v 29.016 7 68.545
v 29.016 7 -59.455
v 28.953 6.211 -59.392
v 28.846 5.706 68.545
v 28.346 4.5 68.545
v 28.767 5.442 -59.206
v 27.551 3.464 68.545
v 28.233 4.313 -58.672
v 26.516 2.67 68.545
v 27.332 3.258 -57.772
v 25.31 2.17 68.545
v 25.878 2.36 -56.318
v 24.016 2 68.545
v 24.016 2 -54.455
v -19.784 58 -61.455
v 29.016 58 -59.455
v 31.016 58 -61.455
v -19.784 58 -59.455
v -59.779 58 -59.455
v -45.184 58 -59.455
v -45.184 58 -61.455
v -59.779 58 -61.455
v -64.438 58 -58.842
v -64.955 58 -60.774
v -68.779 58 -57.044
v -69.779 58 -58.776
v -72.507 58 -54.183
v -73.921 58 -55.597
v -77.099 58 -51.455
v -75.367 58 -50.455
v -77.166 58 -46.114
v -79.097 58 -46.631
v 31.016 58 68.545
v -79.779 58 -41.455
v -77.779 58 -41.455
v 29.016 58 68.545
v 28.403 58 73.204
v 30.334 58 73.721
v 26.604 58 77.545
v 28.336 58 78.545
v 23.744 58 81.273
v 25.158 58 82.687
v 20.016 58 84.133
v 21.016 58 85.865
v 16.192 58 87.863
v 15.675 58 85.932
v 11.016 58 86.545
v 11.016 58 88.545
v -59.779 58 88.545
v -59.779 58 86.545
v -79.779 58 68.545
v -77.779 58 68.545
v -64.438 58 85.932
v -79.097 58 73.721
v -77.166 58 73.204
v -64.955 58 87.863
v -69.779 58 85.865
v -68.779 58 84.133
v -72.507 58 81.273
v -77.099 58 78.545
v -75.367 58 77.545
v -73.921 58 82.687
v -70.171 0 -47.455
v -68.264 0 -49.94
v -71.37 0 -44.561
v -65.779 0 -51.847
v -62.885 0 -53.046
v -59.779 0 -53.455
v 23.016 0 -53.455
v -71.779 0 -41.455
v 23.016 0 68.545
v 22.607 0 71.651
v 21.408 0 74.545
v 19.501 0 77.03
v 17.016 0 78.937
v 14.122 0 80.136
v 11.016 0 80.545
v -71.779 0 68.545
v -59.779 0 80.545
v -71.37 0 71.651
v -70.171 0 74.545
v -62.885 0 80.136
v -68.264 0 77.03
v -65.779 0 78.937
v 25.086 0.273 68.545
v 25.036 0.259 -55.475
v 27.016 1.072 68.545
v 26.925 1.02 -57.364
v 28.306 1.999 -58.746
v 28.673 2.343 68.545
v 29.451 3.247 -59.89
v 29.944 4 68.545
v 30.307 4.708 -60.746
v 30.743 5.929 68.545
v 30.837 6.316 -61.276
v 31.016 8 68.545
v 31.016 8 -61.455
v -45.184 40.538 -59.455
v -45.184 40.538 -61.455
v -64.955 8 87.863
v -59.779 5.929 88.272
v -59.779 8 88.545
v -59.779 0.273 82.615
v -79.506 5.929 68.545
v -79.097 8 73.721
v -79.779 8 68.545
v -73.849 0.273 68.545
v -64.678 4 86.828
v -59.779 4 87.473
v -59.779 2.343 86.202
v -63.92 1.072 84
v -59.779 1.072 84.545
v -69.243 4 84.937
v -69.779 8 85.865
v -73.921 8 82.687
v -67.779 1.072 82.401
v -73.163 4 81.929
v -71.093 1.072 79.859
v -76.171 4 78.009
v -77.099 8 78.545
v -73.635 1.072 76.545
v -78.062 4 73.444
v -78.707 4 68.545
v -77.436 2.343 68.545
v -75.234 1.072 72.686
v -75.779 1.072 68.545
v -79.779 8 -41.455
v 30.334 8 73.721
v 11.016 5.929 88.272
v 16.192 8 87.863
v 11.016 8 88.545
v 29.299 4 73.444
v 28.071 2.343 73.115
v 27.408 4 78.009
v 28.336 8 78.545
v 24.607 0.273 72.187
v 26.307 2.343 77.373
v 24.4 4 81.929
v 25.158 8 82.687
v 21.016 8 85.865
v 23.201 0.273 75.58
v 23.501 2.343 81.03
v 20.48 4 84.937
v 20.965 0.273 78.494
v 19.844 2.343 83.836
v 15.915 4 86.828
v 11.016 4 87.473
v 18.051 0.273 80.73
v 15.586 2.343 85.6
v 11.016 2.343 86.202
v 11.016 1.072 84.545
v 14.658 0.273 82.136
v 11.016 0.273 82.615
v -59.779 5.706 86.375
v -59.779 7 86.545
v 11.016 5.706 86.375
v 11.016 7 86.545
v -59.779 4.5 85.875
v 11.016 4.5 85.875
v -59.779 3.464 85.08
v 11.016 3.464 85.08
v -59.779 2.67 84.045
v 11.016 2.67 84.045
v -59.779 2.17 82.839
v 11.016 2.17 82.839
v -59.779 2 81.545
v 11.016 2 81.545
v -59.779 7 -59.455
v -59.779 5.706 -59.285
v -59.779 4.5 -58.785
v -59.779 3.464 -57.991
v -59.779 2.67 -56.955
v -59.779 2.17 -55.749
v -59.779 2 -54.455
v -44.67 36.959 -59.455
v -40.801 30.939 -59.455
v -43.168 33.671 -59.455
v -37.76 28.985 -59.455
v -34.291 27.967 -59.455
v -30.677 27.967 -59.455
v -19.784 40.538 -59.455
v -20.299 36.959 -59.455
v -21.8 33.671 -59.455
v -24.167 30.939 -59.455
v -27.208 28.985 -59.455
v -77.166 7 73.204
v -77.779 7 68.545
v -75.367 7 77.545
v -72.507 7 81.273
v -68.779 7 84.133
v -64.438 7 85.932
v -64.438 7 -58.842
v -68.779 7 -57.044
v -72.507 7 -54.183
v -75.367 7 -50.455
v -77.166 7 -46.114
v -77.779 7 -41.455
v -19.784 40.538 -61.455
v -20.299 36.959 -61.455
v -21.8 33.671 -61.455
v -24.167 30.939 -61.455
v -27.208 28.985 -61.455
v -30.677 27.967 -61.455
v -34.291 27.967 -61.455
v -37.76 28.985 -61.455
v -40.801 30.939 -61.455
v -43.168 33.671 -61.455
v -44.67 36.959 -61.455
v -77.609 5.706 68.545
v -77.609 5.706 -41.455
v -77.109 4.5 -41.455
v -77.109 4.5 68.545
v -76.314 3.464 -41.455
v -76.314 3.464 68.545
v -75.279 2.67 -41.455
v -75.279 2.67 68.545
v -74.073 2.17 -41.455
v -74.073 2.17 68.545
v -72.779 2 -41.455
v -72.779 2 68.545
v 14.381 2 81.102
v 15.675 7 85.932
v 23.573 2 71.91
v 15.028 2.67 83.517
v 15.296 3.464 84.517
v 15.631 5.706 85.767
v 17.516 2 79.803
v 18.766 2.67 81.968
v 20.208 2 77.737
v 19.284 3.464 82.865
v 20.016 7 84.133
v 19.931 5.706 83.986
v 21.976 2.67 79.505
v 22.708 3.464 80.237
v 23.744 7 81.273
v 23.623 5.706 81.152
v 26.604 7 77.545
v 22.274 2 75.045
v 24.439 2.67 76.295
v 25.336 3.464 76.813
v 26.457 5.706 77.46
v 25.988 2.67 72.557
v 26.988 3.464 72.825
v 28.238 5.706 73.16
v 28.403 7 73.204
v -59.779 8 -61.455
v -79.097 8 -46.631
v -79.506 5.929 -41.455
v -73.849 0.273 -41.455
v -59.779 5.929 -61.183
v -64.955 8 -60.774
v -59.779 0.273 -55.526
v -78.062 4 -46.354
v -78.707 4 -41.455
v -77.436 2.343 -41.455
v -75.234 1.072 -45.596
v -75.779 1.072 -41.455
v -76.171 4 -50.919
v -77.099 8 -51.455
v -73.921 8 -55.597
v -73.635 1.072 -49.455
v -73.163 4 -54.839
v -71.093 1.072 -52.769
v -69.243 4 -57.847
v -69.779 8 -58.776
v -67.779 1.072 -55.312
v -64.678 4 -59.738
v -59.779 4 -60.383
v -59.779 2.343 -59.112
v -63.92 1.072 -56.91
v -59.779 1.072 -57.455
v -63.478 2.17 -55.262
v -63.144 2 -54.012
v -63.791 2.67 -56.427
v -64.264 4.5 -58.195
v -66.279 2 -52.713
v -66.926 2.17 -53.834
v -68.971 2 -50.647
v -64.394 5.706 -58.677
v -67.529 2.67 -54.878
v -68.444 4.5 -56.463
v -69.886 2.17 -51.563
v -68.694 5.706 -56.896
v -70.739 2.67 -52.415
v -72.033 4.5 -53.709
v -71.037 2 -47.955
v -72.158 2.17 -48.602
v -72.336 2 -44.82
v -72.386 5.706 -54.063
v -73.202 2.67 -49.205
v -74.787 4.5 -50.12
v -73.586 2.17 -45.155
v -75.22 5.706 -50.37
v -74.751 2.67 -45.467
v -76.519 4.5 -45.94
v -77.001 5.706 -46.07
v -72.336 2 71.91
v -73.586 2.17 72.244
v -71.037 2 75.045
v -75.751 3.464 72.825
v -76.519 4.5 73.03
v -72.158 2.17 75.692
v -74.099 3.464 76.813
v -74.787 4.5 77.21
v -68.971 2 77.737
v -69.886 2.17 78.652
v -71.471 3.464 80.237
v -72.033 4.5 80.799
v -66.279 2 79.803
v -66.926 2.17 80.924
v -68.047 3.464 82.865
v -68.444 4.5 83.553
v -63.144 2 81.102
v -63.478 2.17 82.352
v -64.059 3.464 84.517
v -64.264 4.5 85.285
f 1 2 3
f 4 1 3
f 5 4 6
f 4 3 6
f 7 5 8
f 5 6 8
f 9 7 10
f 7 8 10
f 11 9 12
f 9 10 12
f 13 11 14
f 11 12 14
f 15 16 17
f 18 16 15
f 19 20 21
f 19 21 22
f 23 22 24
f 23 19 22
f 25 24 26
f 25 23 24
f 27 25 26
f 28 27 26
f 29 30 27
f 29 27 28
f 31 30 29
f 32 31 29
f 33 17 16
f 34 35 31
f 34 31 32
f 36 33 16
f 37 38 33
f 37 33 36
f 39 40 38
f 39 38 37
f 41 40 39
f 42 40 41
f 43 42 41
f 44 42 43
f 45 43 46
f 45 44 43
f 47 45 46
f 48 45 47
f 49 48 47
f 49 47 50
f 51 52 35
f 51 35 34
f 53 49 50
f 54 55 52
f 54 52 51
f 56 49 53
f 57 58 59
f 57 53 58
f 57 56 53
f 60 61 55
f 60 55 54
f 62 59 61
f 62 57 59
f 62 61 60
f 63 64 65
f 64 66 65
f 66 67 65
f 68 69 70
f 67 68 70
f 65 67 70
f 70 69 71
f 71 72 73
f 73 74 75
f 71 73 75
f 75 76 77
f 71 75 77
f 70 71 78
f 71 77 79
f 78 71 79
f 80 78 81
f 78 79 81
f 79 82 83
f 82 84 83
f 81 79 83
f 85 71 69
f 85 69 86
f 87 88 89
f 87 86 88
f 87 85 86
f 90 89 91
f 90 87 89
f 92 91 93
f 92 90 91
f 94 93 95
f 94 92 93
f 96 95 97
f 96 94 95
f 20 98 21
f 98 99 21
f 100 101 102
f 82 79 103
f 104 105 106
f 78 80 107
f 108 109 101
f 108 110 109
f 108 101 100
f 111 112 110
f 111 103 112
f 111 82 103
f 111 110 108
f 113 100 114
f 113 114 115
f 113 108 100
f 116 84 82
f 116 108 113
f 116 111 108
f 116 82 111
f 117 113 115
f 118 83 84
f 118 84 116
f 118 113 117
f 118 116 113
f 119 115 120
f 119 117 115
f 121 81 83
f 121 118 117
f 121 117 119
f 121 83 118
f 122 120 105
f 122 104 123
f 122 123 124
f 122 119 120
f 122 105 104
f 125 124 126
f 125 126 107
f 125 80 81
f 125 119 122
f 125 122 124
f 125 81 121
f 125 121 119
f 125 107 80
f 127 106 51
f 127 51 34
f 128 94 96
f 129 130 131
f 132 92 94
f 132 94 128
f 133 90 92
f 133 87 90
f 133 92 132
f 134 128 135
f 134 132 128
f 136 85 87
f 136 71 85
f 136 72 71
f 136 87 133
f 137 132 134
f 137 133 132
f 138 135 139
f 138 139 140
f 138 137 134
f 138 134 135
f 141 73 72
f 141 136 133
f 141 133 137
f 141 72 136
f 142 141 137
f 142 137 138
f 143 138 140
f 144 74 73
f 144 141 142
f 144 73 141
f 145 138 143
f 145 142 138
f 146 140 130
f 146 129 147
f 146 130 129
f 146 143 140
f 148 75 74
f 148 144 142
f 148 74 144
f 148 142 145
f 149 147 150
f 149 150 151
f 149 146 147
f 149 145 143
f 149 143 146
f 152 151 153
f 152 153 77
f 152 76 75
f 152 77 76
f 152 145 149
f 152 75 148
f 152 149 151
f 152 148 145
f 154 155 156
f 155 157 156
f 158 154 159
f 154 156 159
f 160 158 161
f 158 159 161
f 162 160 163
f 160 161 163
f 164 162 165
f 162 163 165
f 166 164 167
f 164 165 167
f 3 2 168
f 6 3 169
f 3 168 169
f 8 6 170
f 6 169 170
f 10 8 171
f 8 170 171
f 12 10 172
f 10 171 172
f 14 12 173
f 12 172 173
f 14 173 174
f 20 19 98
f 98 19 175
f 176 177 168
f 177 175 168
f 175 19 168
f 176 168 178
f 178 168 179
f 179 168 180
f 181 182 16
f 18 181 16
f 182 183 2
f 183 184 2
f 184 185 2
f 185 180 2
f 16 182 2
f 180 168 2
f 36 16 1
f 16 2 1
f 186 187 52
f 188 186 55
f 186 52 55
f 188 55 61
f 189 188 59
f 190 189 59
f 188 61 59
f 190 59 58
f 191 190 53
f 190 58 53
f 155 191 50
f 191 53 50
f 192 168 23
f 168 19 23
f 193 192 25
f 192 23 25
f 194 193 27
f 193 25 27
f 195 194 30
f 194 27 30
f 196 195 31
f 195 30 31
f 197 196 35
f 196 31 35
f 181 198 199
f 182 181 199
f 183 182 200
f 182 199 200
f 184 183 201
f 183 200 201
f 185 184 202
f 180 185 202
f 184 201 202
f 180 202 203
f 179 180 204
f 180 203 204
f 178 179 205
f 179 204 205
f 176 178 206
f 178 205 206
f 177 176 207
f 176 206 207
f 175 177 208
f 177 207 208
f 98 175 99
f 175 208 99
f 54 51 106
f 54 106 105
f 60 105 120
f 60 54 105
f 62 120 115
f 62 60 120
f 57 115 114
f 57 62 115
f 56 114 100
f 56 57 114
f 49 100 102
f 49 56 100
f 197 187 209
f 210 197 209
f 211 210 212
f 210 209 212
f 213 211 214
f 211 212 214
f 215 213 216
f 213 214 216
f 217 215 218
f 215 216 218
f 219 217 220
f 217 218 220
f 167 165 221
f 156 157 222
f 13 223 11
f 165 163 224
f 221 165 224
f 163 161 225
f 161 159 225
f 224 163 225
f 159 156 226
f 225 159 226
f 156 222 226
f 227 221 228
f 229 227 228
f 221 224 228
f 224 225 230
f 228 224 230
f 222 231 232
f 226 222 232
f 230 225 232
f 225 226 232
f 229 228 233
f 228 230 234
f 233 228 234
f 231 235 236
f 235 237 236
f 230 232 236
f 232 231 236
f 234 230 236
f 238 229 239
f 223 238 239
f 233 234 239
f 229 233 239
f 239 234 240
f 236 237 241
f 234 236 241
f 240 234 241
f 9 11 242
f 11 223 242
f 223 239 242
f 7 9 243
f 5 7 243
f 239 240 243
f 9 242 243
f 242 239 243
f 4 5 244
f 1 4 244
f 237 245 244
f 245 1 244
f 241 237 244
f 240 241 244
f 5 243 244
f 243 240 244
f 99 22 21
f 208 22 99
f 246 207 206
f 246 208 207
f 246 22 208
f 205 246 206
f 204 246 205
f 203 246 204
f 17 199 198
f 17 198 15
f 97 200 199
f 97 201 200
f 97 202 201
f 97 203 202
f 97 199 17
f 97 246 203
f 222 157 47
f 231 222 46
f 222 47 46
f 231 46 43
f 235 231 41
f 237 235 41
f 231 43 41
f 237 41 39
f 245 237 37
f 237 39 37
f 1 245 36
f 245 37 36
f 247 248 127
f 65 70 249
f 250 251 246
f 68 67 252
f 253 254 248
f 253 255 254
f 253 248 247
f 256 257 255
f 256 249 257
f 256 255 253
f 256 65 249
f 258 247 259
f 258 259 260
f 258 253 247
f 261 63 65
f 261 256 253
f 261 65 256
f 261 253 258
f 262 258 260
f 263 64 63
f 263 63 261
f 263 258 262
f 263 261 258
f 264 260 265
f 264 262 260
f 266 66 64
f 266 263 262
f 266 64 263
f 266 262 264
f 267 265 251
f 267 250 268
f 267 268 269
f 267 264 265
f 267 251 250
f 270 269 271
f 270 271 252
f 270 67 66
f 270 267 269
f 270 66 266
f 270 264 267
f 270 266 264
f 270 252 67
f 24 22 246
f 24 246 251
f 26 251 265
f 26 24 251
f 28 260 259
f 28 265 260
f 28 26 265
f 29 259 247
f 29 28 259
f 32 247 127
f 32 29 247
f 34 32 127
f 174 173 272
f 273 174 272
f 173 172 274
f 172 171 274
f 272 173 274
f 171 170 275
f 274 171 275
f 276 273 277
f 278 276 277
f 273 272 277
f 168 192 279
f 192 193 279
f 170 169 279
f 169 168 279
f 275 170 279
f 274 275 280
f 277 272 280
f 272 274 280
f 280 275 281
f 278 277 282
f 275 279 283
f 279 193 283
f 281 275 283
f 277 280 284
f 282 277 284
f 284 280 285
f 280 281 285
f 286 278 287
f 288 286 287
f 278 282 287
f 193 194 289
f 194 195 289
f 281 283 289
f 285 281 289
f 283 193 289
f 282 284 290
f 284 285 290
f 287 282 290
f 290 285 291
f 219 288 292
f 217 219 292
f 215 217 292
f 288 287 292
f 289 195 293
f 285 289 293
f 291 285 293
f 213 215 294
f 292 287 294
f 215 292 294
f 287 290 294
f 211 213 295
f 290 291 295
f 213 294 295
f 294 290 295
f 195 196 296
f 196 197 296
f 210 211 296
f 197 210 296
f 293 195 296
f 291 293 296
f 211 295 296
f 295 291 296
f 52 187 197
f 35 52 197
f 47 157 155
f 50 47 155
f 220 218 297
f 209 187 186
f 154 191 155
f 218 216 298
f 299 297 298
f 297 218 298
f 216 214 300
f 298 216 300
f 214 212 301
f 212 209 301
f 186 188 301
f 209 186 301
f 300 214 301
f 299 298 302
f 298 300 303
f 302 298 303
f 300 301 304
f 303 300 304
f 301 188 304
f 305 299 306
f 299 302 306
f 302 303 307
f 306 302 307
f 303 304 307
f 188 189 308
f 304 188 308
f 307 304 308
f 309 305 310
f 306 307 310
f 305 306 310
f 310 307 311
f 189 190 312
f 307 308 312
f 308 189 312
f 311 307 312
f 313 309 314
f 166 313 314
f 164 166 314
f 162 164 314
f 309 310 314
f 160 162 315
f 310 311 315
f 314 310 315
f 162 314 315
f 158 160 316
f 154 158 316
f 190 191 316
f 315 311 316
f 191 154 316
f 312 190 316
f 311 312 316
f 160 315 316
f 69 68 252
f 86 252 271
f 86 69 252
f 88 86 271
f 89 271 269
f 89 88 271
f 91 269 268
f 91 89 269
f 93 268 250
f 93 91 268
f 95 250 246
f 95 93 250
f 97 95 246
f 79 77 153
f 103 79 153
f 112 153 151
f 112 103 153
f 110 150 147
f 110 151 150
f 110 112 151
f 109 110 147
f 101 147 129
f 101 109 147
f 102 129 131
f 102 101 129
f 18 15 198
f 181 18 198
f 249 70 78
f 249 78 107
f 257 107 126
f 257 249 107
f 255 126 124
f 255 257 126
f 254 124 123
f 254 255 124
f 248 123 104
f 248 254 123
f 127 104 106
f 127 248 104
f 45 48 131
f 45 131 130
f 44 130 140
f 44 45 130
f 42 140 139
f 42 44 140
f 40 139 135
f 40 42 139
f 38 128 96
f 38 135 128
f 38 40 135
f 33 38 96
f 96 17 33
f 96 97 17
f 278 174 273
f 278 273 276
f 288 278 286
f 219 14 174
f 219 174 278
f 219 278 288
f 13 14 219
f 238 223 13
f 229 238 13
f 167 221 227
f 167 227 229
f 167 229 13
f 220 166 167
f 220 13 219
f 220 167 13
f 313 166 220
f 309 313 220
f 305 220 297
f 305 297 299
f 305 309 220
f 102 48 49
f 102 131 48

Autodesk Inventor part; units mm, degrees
ref_plane "YZ Plane" through (0, 0, 0) normal (1, 0, 0) x (0, 1, 0)
ref_plane "XZ Plane" through (0, 0, 0) normal (0, 1, 0) x (-1, 0, 0)
ref_plane "XY Plane" through (0, 0, 0) normal (0, 0, 1) x (1, 0, 0)
sketch "Sketch1" plane through (0, 0, 0) normal (0, 1, 0) x (-1, 0, 0)
  line L0 (79.7789, 88.5449) -> (79.7789, -61.4551)
  line L1 (79.7789, -61.4551) -> (-31.0159, -61.4551)
  line L2 (-31.0159, -61.4551) -> (-31.0159, 88.5449)
  line L3 (-31.0159, 88.5449) -> (79.7789, 88.5449)
  point P0 (0, 0)
  dimension "d0" = 150
  dimension "d1" = 110.7948
extrude "Body" add sketch "Sketch1" along normal blind 58
fillet "Fillet6" radius 20 1 edges at (-79.7789, 29, -61.4551)
fillet "Fillet4" radius 20 1 edges at (-79.7789, 29, 88.5449)
fillet "Fillet2" radius 20 1 edges at (31.0159, 29, 88.5449)
shell "Shell1" thickness 2 removed faces 1 at (-42.8473, 58, 31.8782)
sketch "Sketch6" plane through (31.0159, 0, -61.4551) normal (0, 0, -1) x (-1, 0, 0)
  line L0 (20.28, 18.92) -> (4.4, 18.92)
  line L1 (4.4, 18.92) -> (4.4, 5.42)
  line L2 (4.4, 5.42) -> (20.28, 5.42)
  line L3 (20.28, 5.42) -> (20.28, 18.92)
  line L4 (0, 9.95) -> (4.4, 9.95) construction
  line L5 (0, 0) -> (0, 58) projected
  line L6 (110.7948, 0) -> (0, 0) projected
  line L7 (15.1382, 0) -> (15.1382, 5.42)
  point P0 (20.28, 13.27)
  point P1 (11.2745, 5.42)
  dimension "d38" = 15.88
  dimension "d39" = 13.5
  dimension "d40" = 4.4
  dimension "d97" = 5.42
extrude "Cut_Ethernet" [suppressed]
sketch "Sketch5" plane through (31.0159, 0, -61.4551) normal (0, 0, -1) x (-1, 0, 0)
  line L0 (24.44, 21.12) -> (37.74, 21.12)
  line L1 (37.74, 21.12) -> (37.74, 5.42)
  line L2 (37.74, 5.42) -> (24.44, 5.42)
  line L3 (24.44, 5.42) -> (24.44, 21.12)
  line L4 (42.44, 10.5231) -> (37.74, 10.5231) construction
  line L5 (28.3152, 0) -> (28.3152, 5.42) construction
  line L6 (20.28, 18.92) -> (20.28, 5.42) projected
  line L7 (20.28, 10.8914) -> (24.44, 10.8914) construction
  line L8 (0, 0) -> (110.7948, 0) projected
  point P0 (31.0159, 0)
  point P1 (24.44, 13.27)
  dimension "d32" = 4.7
  dimension "d33" = 5.42
  dimension "d34" = 13.3
  dimension "d35" = 15.7
  dimension "d62" = 4.16
extrude "Cut_USB1" [suppressed]
sketch "Sketch4" plane through (31.0159, 0, -61.4551) normal (0, 0, -1) x (-1, 0, 0)
  line L0 (46.0437, 0) -> (46.0437, 5.42) construction
  line L1 (110.7948, 0) -> (110.7948, 58) projected
  line L2 (42.44, 5.42) -> (55.74, 5.42)
  line L3 (55.74, 5.42) -> (55.74, 21.12)
  line L4 (55.74, 21.12) -> (42.44, 21.12)
  line L5 (42.44, 21.12) -> (42.44, 5.42)
  line L6 (24.44, 21.12) -> (37.74, 21.12)
  line L7 (37.74, 21.12) -> (37.74, 5.42)
  line L8 (37.74, 5.42) -> (24.44, 5.42)
  line L9 (24.44, 5.42) -> (24.44, 21.12)
  line L10 (42.44, 10.5231) -> (37.74, 10.5231) construction
  line L11 (53.709, 2.22) -> (53.709, 5.42) construction
  line L12 (24.44, 13.27) -> (20.28, 13.27) construction
  line L13 (20.28, 18.92) -> (4.4, 18.92)
  line L14 (4.4, 18.92) -> (4.4, 5.42)
  line L15 (4.4, 5.42) -> (20.28, 5.42)
  line L16 (20.28, 5.42) -> (20.28, 18.92)
  line L17 (36.6745, 2.22) -> (36.6745, 5.42) construction
  line L18 (0, 0) -> (0, 58) projected
  line L19 (31.09, 0) -> (31.09, 5.42) construction
  line L20 (4.4, 5.42) -> (4.4, 18.92) projected
  line L21 (0, 0) -> (110.7948, 0) projected
  line L22 (13.4846, 5.42) -> (13.4846, 0) construction
  point P0 (31.0159, 0)
  point P1 (4.4, 12.17)
  dimension "d16" = 5.42
  dimension "d18" = 13.3
  dimension "d19" = 15.7
  dimension "d20" = 4.7
  dimension "d21" = 3.2
  dimension "d22" = 13.3
  dimension "d23" = 15.7
  dimension "d24" = 4.16
  dimension "d25" = 15.88
  dimension "d26" = 13.5
  dimension "d27" = 3.2
  dimension "d29" = 5.42
  dimension "d98" = 5.42
extrude "Cut_USB2" [suppressed]
fillet "Fillet10" radius 5 7 edges at (-77.7789, 2, 13.5449) (-72.5068, 2, 81.2728) (-24.3815, 2, 86.5449) (23.7438, 2, 81.2728) (29.0159, 2, 4.5449) (-72.5068, 2, -54.183) (-15.3815, 2, -59.4551)
fillet "Fillet9" radius 8 7 edges at (-14.3815, 0, -61.4551) (-73.921, 0, -55.5972) (-79.7789, 0, 13.5449) (-73.921, 0, 82.687) (-24.3815, 0, 88.5449) (25.158, 0, 82.687) (31.0159, 0, 3.5449)
sketch "Sketch13" plane through (-59.7789, 0, -61.4551) normal (0, 0, -1) x (-1, 0, 0)
  circle A0 centre (-59.7048, 47.625) radius 4.1 construction
  line L0 (-66.3548, 21.12) -> (-53.0548, 21.12) projected
  line L1 (-59.7048, 21.12) -> (-59.7048, 61.9125) construction
  line L2 (-79.7048, 53.975) -> (-39.7048, 53.975)
  line L3 (-39.7048, 53.975) -> (-39.7048, 25.4)
  line L4 (-39.7048, 25.4) -> (-79.7048, 25.4) construction
  line L5 (-79.7048, 25.4) -> (-79.7048, 53.975)
  line L6 (-79.7048, 39.6875) -> (-39.7048, 39.6875) construction
  line L7 (-79.7048, 42.1875) -> (-39.7048, 42.1875)
  line L8 (-39.7048, 42.1875) -> (-39.7048, 37.1875)
  line L9 (-39.7048, 37.1875) -> (-79.7048, 37.1875) construction
  line L10 (-79.7048, 37.1875) -> (-79.7048, 42.1875)
  line L11 (-74.6125, 42.1875) -> (-74.6125, 37.1875) construction
  line L12 (-79.7048, 42.1875) -> (-79.7048, 53.975)
  line L13 (-39.7048, 53.975) -> (-39.7048, 42.1875)
  point P0 (-59.7789, 0)
  point P1 (-59.7048, 53.975)
  dimension "d93" = 8.2
  dimension "d96" = 40
  dimension "d104" = 5
  dimension "d105" = 28.575
extrude "Extrusion13" [suppressed]
sketch "Sketch15" plane through (31.0159, 58, -61.4551) normal (0, 0, -1) x (-1, 0, 0)
  circle A0 centre (31.09, -10.375) radius 4.1 construction
  line L0 (24.44, -36.88) -> (37.74, -36.88)
  line L1 (31.09, -36.88) -> (31.09, 3.9125) construction
  line L2 (11.09, -4.025) -> (51.09, -4.025) construction
  line L3 (51.09, -4.025) -> (51.09, -32.6) construction
  line L4 (51.09, -32.6) -> (11.09, -32.6)
  line L5 (11.09, -32.6) -> (11.09, -4.025) construction
  line L6 (11.09, -18.3125) -> (51.09, -18.3125) construction
  line L7 (11.09, -15.8125) -> (51.09, -15.8125) construction
  line L8 (51.09, -15.8125) -> (51.09, -20.8125)
  line L9 (51.09, -20.8125) -> (11.09, -20.8125)
  line L10 (11.09, -20.8125) -> (11.09, -15.8125)
  line L11 (16.1823, -15.8125) -> (16.1823, -20.8125) construction
  line L12 (51.09, -4.025) -> (11.1125, -4.025) construction
  line L13 (11.09, -20.8125) -> (11.09, -32.6)
  line L14 (51.09, -32.6) -> (51.09, -20.8125)
  point P0 (31.0159, -58)
  point P1 (-59.7789, 0)
  point P2 (31.09, -4.025)
  dimension "d106" = 8.2
  dimension "d107" = 40
  dimension "d108" = 5
  dimension "d109" = 28.575
extrude "Extrusion14" [suppressed]
sketch "Sketch17" plane through (31.0159, 58, -61.4551) normal (0, 0, -1) x (-1, 0, 0)
  arc A0 (50.8, -17.4625) -> (76.2, -17.4625) centre (63.5, -17.4625) ccw
  line L0 (20, 0) -> (90.7948, 0) projected
  line L1 (50.8, -17.4625) -> (76.2, -17.4625) construction
  line L2 (76.2, -17.4625) -> (76.2, 0)
  line L3 (76.2, 0) -> (72.7075, 0)
  line L4 (50.8, 0) -> (50.8, -17.4625)
  line L5 (0, 0) -> (90.7948, 0) projected
  point P0 (31.0159, -58)
  dimension "d117" = 25.4
  dimension "d124" = 25.4
extrude "Extrusion16" cut sketch "Sketch17" against normal blind 2
properties part number "picaseV2"
